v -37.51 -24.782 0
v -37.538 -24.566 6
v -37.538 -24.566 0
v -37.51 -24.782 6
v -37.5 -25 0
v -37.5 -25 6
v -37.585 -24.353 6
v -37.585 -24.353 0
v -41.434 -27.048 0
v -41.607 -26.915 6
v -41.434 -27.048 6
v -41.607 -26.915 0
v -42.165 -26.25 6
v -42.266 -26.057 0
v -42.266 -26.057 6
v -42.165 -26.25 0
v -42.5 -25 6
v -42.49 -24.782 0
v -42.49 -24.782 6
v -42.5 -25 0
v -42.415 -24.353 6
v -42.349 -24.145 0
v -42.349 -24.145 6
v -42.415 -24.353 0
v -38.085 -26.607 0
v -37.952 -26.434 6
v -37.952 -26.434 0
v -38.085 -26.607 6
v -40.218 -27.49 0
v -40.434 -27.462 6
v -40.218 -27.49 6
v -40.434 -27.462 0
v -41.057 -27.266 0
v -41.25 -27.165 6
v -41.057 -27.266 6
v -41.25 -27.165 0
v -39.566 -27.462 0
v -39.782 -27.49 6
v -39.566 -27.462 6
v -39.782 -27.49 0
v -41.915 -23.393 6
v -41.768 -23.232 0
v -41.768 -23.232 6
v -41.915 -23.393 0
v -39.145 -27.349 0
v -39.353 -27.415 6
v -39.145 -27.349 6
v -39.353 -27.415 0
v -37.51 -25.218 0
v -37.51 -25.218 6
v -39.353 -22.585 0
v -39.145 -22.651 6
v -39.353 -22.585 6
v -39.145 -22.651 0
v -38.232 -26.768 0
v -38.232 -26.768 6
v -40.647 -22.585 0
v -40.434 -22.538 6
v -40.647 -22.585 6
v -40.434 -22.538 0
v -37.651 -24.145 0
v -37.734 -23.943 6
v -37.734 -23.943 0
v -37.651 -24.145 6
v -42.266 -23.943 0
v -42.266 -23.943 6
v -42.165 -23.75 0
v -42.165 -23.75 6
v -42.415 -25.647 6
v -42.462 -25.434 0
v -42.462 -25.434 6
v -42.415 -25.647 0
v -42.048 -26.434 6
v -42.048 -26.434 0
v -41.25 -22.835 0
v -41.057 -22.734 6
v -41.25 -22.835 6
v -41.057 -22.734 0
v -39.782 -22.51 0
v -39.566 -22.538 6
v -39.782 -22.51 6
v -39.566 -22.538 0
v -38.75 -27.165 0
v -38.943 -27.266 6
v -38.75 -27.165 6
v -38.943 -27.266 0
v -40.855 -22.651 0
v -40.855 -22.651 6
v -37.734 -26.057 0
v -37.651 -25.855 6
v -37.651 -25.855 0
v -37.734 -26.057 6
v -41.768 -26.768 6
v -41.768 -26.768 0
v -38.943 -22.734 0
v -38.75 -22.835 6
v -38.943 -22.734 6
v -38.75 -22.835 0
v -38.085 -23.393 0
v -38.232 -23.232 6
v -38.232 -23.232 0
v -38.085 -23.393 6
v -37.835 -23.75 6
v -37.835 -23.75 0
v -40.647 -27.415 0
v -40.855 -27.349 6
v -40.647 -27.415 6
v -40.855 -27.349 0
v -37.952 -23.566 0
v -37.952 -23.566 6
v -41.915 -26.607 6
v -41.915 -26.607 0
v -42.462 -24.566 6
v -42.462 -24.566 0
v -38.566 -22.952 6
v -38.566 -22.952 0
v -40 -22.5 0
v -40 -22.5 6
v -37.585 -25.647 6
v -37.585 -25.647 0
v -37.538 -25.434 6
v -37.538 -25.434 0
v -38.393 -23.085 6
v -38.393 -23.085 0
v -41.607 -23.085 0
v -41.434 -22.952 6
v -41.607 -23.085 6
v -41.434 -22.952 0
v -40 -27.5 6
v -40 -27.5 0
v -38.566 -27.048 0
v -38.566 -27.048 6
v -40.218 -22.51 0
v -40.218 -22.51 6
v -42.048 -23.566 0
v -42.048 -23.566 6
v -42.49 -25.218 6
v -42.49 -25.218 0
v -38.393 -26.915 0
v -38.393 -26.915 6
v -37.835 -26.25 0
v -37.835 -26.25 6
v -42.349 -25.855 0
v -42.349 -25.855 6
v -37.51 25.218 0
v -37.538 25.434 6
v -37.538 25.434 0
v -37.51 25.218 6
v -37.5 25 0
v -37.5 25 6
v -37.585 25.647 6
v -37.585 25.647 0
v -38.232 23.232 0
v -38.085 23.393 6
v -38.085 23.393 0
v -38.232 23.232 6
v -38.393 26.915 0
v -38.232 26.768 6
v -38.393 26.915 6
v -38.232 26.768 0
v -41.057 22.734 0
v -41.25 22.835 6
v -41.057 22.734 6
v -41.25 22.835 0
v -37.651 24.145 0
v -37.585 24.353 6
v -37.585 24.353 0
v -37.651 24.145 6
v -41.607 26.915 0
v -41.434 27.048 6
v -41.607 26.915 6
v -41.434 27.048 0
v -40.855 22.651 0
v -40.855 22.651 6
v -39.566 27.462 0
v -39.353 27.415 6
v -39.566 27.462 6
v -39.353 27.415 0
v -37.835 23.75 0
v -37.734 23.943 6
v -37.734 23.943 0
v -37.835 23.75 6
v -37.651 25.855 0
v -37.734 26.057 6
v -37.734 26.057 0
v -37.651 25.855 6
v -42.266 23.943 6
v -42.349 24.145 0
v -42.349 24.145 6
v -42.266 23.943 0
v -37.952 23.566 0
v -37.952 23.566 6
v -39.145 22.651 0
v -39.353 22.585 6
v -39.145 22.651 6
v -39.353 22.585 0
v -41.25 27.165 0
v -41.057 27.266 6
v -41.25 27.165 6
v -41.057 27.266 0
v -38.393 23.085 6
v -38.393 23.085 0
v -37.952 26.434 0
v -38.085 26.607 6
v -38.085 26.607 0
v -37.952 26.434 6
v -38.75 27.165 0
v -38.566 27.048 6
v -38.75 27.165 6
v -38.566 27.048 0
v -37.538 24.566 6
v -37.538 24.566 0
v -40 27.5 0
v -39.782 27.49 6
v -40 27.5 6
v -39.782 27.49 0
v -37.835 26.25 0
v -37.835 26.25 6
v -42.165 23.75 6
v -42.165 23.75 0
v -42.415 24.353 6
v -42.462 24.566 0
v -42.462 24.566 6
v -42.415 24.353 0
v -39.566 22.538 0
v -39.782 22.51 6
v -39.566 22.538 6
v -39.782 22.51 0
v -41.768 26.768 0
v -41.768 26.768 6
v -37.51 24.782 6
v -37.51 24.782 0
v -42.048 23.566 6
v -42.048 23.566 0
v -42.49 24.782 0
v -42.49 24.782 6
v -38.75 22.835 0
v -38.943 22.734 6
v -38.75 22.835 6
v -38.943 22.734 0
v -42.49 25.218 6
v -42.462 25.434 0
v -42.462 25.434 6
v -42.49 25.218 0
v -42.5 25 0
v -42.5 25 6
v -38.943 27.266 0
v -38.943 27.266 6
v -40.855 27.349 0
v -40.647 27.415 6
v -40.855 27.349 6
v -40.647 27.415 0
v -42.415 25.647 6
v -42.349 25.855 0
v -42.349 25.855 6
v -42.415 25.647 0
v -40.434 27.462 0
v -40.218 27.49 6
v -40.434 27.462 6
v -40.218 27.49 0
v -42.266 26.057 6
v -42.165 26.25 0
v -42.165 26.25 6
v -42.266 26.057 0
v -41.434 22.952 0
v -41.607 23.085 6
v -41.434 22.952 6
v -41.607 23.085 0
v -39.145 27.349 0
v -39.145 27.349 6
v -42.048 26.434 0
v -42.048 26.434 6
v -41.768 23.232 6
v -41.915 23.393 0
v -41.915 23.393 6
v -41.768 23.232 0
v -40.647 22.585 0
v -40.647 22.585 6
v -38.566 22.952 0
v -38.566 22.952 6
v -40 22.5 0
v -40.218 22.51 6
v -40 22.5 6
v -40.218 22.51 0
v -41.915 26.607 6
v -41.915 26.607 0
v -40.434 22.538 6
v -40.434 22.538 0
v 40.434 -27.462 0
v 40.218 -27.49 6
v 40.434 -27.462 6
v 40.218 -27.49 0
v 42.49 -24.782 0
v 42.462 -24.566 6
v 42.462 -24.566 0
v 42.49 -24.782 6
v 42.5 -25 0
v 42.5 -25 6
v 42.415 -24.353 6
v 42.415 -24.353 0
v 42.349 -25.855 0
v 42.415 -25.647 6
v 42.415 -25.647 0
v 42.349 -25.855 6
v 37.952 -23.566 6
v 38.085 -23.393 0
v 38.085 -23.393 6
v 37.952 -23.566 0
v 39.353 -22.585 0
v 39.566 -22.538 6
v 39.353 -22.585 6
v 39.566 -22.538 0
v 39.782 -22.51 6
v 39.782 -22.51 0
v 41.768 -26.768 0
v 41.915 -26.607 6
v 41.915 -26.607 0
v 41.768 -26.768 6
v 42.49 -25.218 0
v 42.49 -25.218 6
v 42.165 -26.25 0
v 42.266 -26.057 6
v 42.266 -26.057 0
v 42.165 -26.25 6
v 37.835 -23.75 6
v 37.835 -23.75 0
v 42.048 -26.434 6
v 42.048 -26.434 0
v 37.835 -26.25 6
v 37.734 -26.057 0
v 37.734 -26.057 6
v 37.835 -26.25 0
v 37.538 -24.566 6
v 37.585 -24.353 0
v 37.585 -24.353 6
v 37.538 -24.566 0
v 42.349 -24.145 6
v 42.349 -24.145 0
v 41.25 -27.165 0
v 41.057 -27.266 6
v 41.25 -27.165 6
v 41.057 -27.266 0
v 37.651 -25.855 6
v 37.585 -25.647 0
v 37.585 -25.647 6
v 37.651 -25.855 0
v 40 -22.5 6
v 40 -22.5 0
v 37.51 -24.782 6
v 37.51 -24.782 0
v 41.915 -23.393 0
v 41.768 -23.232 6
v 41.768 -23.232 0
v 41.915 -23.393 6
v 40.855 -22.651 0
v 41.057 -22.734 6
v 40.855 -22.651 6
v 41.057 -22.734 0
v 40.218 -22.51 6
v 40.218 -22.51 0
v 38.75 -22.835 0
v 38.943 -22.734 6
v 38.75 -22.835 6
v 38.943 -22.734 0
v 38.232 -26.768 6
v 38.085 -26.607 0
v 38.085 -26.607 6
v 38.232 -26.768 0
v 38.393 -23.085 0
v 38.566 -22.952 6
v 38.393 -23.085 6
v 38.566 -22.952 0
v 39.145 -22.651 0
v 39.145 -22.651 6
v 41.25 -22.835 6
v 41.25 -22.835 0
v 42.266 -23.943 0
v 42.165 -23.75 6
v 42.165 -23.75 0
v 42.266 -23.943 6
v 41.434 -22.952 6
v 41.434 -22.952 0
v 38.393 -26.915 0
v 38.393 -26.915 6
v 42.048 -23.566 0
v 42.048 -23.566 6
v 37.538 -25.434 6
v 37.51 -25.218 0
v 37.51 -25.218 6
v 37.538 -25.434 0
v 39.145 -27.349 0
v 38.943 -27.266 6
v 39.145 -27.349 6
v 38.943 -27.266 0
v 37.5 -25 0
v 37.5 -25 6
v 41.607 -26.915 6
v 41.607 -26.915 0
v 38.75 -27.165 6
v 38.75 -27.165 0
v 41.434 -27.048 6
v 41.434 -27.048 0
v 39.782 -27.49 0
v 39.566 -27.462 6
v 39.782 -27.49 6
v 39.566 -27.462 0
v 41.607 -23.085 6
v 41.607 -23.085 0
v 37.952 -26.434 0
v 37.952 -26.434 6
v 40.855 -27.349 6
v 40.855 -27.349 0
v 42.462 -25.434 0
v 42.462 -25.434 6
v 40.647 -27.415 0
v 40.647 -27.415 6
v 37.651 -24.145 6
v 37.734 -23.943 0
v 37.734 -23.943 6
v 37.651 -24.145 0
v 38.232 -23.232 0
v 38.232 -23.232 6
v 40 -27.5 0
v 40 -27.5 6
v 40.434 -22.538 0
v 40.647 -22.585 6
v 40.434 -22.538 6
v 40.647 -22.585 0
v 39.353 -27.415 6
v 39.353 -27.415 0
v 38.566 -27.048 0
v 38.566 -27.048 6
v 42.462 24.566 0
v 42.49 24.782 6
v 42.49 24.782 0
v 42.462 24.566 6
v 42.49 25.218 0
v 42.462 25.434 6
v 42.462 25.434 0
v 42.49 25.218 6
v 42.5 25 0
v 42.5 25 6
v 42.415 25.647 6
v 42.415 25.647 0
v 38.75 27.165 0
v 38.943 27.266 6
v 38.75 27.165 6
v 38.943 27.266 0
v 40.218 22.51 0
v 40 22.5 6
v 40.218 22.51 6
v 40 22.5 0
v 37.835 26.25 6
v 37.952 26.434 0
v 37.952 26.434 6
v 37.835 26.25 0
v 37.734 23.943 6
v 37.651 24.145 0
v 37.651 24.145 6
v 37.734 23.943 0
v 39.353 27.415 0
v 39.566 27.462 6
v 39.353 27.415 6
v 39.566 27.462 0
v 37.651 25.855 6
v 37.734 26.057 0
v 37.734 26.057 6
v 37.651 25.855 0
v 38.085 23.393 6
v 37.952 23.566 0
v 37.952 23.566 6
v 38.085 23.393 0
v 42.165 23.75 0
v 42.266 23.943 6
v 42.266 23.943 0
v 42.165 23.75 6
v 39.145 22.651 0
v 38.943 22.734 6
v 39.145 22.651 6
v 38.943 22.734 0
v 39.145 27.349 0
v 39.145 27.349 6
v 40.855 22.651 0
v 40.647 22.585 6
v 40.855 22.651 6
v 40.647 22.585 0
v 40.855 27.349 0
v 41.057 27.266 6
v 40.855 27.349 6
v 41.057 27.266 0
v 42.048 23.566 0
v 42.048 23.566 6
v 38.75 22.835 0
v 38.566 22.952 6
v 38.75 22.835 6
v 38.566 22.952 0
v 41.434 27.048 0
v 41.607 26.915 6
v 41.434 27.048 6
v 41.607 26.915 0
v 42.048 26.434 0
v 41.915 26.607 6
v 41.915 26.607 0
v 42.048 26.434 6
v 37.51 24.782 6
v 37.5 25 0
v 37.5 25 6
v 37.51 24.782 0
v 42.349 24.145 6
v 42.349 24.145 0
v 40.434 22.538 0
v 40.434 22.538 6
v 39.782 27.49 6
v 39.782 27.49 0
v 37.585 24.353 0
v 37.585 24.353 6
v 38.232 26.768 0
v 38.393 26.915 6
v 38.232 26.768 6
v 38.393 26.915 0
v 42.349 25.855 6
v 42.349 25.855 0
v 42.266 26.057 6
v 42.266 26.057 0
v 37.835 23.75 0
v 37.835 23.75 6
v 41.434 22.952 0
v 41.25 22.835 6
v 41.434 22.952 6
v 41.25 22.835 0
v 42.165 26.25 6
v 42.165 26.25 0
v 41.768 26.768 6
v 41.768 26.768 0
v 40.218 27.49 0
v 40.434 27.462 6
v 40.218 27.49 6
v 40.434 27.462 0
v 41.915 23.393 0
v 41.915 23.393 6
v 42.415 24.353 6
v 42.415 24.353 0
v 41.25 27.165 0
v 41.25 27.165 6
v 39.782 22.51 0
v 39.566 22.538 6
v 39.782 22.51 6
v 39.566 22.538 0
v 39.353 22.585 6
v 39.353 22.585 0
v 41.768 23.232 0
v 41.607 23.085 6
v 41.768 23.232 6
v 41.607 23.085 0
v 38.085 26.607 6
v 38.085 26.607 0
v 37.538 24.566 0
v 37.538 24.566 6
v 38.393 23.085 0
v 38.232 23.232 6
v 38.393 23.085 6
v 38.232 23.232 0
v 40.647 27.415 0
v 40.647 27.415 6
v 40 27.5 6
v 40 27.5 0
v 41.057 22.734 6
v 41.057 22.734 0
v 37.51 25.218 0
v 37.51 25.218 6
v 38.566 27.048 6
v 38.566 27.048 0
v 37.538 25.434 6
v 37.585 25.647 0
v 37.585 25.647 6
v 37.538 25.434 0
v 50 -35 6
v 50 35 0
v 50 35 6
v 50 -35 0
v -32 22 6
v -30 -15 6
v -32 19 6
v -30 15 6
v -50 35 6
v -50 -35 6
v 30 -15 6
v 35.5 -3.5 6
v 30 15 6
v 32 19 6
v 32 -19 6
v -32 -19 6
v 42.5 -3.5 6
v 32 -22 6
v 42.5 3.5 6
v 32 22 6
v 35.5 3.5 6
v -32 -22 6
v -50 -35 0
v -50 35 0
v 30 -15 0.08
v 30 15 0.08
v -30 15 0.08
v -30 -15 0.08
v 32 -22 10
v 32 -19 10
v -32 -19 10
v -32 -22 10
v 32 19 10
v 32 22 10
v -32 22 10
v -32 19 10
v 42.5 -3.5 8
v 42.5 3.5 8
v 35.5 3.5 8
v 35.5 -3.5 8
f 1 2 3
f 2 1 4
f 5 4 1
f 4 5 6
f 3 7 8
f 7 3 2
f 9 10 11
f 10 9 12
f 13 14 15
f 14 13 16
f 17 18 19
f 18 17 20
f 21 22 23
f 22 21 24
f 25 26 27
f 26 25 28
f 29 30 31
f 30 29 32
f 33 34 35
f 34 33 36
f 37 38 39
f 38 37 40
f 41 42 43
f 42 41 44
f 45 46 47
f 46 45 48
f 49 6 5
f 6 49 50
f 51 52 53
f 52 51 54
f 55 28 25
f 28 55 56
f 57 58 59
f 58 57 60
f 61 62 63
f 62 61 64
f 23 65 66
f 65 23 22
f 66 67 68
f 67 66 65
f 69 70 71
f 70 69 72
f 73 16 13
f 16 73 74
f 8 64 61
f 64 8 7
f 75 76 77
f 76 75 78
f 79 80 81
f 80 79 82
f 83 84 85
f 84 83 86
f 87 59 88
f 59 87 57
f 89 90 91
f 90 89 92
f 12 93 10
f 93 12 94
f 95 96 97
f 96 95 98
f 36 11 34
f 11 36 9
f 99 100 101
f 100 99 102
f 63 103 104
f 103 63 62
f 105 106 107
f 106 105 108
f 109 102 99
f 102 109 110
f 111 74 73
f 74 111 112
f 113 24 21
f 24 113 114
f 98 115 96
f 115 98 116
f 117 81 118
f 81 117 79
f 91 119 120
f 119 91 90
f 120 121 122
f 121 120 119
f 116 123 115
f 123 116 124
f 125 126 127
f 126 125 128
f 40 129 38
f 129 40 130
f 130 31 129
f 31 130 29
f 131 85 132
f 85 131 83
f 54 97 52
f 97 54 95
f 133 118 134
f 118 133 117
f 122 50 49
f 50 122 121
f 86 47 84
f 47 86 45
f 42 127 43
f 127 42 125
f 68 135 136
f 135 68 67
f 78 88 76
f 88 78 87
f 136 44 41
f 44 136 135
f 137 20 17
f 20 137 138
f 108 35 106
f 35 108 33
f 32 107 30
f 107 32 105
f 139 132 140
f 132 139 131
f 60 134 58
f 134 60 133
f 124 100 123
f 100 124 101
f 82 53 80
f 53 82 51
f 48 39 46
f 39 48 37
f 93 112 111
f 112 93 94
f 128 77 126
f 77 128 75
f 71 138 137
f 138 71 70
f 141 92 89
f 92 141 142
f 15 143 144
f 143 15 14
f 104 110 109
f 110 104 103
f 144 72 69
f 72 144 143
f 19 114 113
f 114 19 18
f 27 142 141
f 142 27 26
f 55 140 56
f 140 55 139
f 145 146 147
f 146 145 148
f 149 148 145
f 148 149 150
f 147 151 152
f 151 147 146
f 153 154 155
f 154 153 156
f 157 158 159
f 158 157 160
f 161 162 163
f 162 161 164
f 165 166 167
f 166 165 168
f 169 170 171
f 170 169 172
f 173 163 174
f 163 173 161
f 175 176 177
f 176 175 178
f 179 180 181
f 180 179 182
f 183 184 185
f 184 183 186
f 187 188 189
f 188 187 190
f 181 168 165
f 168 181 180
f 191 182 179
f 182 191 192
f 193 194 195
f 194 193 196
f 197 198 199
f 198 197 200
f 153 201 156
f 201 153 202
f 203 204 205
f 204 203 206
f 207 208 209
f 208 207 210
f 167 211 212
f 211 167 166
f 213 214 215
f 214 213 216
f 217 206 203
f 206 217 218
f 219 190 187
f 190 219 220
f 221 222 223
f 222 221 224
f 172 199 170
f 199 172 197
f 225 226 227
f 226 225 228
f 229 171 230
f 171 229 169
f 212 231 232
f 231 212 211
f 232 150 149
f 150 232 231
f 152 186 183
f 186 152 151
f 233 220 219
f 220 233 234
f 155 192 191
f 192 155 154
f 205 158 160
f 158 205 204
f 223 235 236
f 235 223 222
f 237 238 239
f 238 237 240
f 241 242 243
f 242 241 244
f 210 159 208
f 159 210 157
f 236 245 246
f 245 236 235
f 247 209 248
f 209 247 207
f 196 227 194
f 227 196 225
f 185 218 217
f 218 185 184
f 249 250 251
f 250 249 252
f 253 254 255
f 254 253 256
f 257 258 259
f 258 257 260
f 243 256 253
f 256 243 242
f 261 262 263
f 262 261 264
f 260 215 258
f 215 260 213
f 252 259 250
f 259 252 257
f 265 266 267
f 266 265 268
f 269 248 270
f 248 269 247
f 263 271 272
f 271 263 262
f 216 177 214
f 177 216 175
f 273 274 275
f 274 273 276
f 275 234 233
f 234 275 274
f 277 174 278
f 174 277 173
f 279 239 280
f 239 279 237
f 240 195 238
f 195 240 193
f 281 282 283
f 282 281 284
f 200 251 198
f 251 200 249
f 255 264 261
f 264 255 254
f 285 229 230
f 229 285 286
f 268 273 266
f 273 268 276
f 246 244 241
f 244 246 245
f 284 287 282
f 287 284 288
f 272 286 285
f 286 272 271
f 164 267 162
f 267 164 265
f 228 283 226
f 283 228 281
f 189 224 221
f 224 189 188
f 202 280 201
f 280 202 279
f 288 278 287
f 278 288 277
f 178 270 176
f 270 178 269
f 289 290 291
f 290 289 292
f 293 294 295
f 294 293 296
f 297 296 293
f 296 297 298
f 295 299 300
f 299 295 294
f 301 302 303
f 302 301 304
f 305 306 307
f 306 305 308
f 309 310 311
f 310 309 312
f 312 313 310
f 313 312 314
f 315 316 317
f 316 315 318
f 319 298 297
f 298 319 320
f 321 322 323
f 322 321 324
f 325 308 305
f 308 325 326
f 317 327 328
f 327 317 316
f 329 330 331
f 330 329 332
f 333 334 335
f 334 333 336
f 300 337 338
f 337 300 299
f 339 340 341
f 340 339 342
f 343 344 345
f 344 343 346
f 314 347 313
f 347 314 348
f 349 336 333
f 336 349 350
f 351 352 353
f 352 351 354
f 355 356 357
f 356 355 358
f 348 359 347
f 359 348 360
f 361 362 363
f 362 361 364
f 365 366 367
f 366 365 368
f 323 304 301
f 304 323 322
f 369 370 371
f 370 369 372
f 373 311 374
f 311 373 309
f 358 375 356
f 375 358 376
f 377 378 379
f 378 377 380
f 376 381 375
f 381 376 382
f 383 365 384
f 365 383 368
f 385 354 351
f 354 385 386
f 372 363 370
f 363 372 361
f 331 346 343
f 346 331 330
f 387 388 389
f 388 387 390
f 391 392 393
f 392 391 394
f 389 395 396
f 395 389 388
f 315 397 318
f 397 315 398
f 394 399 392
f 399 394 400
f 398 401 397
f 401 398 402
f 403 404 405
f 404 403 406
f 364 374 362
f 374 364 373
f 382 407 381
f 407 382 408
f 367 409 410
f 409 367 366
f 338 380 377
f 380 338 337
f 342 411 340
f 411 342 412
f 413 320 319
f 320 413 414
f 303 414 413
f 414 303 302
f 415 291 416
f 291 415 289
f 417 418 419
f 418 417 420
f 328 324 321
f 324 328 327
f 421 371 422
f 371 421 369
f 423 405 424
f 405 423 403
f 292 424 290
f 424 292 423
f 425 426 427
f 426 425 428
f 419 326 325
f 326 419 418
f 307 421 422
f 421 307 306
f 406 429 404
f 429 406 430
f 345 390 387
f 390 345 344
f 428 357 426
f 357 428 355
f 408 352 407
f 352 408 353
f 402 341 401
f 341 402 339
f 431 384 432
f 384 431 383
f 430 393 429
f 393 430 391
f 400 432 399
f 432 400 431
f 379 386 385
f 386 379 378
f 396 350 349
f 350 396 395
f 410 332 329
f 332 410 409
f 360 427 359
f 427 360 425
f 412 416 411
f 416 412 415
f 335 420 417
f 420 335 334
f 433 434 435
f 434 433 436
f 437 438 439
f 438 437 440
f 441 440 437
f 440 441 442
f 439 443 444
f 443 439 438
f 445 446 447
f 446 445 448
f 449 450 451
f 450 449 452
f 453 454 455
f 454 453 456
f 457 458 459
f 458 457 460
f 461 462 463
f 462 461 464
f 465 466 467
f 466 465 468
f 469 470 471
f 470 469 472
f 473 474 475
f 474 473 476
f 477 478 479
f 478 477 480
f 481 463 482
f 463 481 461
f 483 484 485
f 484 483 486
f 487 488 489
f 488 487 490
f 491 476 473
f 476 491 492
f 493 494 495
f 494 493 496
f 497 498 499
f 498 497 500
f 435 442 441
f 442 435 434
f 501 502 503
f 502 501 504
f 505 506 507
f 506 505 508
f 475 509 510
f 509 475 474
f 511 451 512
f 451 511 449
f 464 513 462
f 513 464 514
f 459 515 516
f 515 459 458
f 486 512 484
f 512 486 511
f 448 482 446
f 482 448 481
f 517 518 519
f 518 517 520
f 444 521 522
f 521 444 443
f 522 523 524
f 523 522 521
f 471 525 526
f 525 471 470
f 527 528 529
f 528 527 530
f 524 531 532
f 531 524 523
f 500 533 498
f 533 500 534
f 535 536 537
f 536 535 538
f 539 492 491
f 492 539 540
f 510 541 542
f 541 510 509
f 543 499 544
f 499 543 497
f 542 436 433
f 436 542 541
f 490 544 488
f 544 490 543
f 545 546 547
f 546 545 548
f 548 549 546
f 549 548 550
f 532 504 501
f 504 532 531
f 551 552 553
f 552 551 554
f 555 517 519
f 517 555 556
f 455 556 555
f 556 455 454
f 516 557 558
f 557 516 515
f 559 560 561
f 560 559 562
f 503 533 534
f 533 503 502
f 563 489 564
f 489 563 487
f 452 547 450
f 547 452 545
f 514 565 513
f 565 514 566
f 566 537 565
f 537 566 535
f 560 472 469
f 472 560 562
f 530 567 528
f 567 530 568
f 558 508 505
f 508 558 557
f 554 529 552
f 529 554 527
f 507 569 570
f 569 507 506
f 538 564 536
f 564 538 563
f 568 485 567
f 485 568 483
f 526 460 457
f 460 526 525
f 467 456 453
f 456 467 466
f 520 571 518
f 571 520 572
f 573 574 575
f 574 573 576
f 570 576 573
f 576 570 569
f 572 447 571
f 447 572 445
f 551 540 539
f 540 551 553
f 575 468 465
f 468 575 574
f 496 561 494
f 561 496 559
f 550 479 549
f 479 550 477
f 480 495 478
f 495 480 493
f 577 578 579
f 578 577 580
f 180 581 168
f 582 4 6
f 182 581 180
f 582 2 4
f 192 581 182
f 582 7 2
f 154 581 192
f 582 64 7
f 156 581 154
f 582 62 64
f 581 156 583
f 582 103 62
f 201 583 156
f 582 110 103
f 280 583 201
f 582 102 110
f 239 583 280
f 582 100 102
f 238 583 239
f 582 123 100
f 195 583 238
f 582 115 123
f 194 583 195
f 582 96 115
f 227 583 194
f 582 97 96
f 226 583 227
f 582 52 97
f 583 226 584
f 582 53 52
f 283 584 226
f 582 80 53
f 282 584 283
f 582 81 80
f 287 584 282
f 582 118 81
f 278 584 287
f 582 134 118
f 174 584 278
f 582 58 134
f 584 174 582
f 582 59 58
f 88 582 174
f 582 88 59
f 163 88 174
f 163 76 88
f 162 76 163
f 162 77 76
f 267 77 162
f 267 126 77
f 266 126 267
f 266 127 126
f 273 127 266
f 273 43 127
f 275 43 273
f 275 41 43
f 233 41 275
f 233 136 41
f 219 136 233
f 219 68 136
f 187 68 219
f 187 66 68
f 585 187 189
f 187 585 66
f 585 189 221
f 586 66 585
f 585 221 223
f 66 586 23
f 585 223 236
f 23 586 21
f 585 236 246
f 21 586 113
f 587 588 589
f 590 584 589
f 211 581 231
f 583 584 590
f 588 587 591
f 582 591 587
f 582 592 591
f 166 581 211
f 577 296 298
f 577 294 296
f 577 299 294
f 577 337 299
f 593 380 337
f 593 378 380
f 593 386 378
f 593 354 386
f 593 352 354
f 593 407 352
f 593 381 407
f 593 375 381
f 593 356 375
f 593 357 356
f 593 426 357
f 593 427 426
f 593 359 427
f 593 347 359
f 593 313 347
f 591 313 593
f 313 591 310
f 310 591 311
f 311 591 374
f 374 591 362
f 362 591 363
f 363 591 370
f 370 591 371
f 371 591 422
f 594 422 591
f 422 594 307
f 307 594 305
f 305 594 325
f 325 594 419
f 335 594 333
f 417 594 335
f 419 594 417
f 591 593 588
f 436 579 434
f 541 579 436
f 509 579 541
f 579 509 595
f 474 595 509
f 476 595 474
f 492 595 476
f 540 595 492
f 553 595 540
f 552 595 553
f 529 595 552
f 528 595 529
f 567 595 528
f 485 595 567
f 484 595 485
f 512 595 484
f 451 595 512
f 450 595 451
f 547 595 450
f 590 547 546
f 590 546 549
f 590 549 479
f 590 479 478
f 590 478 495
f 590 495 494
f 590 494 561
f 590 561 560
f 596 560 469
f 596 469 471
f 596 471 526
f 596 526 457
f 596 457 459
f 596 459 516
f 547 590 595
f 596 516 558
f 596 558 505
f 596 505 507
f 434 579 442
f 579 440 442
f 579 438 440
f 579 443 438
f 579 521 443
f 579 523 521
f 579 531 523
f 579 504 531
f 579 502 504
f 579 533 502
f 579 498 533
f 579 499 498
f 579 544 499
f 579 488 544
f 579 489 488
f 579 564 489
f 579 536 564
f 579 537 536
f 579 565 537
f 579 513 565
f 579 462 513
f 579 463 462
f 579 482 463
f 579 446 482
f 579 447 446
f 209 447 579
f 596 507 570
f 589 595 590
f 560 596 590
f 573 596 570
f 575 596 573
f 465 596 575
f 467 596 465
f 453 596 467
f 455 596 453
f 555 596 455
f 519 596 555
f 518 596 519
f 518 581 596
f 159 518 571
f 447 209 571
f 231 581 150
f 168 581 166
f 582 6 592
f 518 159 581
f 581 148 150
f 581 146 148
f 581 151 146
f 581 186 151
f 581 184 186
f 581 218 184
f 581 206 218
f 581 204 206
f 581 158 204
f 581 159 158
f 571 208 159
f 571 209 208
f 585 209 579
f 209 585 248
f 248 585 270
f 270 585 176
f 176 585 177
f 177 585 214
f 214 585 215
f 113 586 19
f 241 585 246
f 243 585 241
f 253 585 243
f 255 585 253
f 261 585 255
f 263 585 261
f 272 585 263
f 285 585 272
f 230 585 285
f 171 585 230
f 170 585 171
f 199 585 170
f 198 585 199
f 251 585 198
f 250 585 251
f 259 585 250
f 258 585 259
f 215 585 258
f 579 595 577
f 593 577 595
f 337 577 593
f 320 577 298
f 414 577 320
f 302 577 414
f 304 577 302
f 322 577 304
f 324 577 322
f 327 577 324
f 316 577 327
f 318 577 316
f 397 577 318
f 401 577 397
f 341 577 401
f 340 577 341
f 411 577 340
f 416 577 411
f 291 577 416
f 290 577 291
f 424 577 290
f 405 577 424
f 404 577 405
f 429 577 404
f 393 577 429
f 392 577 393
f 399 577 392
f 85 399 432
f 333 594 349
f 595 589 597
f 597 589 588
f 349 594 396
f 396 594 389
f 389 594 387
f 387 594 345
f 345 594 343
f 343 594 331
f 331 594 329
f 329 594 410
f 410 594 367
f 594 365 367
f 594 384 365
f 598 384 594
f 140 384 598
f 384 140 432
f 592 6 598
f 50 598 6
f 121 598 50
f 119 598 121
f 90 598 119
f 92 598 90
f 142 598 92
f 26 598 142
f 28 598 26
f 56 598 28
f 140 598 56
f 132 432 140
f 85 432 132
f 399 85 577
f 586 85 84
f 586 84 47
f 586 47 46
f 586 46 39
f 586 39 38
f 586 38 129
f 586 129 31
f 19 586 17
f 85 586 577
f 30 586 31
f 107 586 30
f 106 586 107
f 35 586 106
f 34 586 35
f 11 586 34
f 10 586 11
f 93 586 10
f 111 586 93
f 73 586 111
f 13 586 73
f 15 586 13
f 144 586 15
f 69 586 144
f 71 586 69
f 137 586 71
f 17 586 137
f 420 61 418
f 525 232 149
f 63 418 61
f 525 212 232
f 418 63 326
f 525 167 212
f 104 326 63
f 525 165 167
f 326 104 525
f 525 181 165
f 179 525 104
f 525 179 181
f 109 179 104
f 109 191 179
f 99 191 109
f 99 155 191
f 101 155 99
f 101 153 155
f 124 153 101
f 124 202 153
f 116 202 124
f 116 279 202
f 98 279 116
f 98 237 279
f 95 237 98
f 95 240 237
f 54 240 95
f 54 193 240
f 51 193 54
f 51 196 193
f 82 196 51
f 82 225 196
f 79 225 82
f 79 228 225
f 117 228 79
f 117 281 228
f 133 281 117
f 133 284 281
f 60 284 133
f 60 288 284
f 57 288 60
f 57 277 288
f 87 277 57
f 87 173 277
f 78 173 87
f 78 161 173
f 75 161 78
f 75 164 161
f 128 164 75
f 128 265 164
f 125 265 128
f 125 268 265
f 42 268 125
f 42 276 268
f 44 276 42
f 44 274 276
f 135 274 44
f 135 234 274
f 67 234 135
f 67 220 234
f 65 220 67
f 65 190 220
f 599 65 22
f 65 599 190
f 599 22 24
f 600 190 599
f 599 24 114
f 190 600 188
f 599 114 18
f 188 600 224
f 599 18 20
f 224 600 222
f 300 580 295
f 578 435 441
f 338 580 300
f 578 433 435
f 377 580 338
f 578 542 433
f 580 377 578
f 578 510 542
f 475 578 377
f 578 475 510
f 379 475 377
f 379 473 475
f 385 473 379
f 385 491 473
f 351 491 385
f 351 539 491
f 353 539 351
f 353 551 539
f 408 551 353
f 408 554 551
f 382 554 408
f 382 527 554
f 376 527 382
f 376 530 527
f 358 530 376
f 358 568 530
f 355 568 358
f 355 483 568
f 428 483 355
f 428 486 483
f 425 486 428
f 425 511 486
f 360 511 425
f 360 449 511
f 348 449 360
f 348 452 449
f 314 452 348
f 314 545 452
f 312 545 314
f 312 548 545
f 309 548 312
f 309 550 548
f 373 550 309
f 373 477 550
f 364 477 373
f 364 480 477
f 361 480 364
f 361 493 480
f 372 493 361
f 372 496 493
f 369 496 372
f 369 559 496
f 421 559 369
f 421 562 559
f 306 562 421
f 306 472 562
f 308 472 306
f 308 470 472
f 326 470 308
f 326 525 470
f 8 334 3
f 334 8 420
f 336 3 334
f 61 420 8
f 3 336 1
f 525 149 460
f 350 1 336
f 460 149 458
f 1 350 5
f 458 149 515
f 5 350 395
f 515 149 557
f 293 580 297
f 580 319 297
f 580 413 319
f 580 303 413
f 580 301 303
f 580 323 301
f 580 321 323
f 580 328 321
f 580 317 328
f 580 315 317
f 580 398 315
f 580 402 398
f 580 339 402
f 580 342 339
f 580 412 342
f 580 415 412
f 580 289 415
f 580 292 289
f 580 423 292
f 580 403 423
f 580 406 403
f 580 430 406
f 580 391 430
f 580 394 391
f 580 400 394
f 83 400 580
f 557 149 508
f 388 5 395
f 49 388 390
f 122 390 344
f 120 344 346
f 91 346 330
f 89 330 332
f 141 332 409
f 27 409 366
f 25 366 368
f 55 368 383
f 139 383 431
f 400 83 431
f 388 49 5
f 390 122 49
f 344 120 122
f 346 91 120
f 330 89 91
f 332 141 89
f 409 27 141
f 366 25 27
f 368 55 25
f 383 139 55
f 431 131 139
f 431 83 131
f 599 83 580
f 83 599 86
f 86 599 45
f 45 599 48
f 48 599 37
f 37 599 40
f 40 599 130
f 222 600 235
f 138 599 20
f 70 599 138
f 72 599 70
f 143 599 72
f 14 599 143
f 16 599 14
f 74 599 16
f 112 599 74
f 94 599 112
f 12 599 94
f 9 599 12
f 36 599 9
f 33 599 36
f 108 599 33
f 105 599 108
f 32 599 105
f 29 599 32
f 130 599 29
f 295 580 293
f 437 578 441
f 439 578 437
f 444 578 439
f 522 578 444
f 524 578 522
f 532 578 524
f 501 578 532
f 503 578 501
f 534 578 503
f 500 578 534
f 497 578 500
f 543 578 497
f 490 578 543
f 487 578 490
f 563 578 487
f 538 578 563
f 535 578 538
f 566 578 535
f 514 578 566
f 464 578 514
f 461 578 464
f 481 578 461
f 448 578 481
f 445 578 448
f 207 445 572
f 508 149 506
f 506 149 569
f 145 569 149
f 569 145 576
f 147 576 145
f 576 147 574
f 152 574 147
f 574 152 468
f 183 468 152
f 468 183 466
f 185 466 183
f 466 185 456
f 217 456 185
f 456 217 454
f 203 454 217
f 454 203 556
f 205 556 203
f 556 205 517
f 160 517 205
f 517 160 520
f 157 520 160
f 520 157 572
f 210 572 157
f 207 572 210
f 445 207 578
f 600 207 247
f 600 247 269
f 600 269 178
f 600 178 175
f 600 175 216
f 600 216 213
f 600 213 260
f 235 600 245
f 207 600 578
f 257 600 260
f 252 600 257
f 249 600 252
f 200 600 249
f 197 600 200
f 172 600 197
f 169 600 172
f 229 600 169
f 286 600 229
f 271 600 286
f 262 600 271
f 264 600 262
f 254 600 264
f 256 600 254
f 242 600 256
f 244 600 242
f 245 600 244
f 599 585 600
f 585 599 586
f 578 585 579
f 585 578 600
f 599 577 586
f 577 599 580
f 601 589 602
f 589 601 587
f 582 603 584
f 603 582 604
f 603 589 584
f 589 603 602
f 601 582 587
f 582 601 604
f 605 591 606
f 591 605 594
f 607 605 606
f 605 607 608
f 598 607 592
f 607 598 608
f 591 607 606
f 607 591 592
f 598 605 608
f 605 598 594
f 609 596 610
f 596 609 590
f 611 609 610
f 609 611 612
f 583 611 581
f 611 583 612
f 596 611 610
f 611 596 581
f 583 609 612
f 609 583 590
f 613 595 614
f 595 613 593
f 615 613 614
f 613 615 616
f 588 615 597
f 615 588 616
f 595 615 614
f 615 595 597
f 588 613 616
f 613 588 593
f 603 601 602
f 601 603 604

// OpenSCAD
// Microfluidic chip imaging holder — reference solution
// Category: tools; purpose: repeatable positioning during optical chip imaging
// Print on flat base with z=0 on bed; PLA/PETG, no supports; not certified for clinical or sterile use
// SPDX-License-Identifier: CERN-OHL-P-2.0
$fn=72;
eps=0.05;
base_x=100;
base_y=70;
base_h=6;
window_x=60;
window_y=30;
hole_d=5;
hole_pitch_x=80;
hole_pitch_y=50;
rail_len=64;
rail_width=3;
rail_h=4;
rail_center_y=20.5;
marker_x=7;
marker_y=7;
marker_h=2;
marker_center_x=39;
assert(base_x > window_x + 2*hole_d);
assert(base_y > window_y + 2*hole_d);
assert(hole_pitch_x/2+hole_d/2 < base_x/2);
assert(hole_pitch_y/2+hole_d/2 < base_y/2);
assert(rail_center_y - rail_width/2 > window_y/2);
module reference(){
 union(){
  difference(){
   translate([-base_x/2,-base_y/2,0]) cube([base_x,base_y,base_h]);
   translate([-window_x/2,-window_y/2,-eps]) cube([window_x,window_y,base_h+2*eps]);
   for(x=[-hole_pitch_x/2,hole_pitch_x/2])
    for(y=[-hole_pitch_y/2,hole_pitch_y/2])
     translate([x,y,-eps]) cylinder(d=hole_d,h=base_h+2*eps);
  }
  for(y=[-rail_center_y,rail_center_y])
   translate([-rail_len/2,y-rail_width/2,base_h-eps])
    cube([rail_len,rail_width,rail_h+eps]);
  translate([marker_center_x-marker_x/2,-marker_y/2,base_h-eps])
   cube([marker_x,marker_y,marker_h+eps]);
 }
}
reference();

// Near-surface obstruction.
translate([-30.05,-15.05,0])cube([60.1,30.1,.08]);
